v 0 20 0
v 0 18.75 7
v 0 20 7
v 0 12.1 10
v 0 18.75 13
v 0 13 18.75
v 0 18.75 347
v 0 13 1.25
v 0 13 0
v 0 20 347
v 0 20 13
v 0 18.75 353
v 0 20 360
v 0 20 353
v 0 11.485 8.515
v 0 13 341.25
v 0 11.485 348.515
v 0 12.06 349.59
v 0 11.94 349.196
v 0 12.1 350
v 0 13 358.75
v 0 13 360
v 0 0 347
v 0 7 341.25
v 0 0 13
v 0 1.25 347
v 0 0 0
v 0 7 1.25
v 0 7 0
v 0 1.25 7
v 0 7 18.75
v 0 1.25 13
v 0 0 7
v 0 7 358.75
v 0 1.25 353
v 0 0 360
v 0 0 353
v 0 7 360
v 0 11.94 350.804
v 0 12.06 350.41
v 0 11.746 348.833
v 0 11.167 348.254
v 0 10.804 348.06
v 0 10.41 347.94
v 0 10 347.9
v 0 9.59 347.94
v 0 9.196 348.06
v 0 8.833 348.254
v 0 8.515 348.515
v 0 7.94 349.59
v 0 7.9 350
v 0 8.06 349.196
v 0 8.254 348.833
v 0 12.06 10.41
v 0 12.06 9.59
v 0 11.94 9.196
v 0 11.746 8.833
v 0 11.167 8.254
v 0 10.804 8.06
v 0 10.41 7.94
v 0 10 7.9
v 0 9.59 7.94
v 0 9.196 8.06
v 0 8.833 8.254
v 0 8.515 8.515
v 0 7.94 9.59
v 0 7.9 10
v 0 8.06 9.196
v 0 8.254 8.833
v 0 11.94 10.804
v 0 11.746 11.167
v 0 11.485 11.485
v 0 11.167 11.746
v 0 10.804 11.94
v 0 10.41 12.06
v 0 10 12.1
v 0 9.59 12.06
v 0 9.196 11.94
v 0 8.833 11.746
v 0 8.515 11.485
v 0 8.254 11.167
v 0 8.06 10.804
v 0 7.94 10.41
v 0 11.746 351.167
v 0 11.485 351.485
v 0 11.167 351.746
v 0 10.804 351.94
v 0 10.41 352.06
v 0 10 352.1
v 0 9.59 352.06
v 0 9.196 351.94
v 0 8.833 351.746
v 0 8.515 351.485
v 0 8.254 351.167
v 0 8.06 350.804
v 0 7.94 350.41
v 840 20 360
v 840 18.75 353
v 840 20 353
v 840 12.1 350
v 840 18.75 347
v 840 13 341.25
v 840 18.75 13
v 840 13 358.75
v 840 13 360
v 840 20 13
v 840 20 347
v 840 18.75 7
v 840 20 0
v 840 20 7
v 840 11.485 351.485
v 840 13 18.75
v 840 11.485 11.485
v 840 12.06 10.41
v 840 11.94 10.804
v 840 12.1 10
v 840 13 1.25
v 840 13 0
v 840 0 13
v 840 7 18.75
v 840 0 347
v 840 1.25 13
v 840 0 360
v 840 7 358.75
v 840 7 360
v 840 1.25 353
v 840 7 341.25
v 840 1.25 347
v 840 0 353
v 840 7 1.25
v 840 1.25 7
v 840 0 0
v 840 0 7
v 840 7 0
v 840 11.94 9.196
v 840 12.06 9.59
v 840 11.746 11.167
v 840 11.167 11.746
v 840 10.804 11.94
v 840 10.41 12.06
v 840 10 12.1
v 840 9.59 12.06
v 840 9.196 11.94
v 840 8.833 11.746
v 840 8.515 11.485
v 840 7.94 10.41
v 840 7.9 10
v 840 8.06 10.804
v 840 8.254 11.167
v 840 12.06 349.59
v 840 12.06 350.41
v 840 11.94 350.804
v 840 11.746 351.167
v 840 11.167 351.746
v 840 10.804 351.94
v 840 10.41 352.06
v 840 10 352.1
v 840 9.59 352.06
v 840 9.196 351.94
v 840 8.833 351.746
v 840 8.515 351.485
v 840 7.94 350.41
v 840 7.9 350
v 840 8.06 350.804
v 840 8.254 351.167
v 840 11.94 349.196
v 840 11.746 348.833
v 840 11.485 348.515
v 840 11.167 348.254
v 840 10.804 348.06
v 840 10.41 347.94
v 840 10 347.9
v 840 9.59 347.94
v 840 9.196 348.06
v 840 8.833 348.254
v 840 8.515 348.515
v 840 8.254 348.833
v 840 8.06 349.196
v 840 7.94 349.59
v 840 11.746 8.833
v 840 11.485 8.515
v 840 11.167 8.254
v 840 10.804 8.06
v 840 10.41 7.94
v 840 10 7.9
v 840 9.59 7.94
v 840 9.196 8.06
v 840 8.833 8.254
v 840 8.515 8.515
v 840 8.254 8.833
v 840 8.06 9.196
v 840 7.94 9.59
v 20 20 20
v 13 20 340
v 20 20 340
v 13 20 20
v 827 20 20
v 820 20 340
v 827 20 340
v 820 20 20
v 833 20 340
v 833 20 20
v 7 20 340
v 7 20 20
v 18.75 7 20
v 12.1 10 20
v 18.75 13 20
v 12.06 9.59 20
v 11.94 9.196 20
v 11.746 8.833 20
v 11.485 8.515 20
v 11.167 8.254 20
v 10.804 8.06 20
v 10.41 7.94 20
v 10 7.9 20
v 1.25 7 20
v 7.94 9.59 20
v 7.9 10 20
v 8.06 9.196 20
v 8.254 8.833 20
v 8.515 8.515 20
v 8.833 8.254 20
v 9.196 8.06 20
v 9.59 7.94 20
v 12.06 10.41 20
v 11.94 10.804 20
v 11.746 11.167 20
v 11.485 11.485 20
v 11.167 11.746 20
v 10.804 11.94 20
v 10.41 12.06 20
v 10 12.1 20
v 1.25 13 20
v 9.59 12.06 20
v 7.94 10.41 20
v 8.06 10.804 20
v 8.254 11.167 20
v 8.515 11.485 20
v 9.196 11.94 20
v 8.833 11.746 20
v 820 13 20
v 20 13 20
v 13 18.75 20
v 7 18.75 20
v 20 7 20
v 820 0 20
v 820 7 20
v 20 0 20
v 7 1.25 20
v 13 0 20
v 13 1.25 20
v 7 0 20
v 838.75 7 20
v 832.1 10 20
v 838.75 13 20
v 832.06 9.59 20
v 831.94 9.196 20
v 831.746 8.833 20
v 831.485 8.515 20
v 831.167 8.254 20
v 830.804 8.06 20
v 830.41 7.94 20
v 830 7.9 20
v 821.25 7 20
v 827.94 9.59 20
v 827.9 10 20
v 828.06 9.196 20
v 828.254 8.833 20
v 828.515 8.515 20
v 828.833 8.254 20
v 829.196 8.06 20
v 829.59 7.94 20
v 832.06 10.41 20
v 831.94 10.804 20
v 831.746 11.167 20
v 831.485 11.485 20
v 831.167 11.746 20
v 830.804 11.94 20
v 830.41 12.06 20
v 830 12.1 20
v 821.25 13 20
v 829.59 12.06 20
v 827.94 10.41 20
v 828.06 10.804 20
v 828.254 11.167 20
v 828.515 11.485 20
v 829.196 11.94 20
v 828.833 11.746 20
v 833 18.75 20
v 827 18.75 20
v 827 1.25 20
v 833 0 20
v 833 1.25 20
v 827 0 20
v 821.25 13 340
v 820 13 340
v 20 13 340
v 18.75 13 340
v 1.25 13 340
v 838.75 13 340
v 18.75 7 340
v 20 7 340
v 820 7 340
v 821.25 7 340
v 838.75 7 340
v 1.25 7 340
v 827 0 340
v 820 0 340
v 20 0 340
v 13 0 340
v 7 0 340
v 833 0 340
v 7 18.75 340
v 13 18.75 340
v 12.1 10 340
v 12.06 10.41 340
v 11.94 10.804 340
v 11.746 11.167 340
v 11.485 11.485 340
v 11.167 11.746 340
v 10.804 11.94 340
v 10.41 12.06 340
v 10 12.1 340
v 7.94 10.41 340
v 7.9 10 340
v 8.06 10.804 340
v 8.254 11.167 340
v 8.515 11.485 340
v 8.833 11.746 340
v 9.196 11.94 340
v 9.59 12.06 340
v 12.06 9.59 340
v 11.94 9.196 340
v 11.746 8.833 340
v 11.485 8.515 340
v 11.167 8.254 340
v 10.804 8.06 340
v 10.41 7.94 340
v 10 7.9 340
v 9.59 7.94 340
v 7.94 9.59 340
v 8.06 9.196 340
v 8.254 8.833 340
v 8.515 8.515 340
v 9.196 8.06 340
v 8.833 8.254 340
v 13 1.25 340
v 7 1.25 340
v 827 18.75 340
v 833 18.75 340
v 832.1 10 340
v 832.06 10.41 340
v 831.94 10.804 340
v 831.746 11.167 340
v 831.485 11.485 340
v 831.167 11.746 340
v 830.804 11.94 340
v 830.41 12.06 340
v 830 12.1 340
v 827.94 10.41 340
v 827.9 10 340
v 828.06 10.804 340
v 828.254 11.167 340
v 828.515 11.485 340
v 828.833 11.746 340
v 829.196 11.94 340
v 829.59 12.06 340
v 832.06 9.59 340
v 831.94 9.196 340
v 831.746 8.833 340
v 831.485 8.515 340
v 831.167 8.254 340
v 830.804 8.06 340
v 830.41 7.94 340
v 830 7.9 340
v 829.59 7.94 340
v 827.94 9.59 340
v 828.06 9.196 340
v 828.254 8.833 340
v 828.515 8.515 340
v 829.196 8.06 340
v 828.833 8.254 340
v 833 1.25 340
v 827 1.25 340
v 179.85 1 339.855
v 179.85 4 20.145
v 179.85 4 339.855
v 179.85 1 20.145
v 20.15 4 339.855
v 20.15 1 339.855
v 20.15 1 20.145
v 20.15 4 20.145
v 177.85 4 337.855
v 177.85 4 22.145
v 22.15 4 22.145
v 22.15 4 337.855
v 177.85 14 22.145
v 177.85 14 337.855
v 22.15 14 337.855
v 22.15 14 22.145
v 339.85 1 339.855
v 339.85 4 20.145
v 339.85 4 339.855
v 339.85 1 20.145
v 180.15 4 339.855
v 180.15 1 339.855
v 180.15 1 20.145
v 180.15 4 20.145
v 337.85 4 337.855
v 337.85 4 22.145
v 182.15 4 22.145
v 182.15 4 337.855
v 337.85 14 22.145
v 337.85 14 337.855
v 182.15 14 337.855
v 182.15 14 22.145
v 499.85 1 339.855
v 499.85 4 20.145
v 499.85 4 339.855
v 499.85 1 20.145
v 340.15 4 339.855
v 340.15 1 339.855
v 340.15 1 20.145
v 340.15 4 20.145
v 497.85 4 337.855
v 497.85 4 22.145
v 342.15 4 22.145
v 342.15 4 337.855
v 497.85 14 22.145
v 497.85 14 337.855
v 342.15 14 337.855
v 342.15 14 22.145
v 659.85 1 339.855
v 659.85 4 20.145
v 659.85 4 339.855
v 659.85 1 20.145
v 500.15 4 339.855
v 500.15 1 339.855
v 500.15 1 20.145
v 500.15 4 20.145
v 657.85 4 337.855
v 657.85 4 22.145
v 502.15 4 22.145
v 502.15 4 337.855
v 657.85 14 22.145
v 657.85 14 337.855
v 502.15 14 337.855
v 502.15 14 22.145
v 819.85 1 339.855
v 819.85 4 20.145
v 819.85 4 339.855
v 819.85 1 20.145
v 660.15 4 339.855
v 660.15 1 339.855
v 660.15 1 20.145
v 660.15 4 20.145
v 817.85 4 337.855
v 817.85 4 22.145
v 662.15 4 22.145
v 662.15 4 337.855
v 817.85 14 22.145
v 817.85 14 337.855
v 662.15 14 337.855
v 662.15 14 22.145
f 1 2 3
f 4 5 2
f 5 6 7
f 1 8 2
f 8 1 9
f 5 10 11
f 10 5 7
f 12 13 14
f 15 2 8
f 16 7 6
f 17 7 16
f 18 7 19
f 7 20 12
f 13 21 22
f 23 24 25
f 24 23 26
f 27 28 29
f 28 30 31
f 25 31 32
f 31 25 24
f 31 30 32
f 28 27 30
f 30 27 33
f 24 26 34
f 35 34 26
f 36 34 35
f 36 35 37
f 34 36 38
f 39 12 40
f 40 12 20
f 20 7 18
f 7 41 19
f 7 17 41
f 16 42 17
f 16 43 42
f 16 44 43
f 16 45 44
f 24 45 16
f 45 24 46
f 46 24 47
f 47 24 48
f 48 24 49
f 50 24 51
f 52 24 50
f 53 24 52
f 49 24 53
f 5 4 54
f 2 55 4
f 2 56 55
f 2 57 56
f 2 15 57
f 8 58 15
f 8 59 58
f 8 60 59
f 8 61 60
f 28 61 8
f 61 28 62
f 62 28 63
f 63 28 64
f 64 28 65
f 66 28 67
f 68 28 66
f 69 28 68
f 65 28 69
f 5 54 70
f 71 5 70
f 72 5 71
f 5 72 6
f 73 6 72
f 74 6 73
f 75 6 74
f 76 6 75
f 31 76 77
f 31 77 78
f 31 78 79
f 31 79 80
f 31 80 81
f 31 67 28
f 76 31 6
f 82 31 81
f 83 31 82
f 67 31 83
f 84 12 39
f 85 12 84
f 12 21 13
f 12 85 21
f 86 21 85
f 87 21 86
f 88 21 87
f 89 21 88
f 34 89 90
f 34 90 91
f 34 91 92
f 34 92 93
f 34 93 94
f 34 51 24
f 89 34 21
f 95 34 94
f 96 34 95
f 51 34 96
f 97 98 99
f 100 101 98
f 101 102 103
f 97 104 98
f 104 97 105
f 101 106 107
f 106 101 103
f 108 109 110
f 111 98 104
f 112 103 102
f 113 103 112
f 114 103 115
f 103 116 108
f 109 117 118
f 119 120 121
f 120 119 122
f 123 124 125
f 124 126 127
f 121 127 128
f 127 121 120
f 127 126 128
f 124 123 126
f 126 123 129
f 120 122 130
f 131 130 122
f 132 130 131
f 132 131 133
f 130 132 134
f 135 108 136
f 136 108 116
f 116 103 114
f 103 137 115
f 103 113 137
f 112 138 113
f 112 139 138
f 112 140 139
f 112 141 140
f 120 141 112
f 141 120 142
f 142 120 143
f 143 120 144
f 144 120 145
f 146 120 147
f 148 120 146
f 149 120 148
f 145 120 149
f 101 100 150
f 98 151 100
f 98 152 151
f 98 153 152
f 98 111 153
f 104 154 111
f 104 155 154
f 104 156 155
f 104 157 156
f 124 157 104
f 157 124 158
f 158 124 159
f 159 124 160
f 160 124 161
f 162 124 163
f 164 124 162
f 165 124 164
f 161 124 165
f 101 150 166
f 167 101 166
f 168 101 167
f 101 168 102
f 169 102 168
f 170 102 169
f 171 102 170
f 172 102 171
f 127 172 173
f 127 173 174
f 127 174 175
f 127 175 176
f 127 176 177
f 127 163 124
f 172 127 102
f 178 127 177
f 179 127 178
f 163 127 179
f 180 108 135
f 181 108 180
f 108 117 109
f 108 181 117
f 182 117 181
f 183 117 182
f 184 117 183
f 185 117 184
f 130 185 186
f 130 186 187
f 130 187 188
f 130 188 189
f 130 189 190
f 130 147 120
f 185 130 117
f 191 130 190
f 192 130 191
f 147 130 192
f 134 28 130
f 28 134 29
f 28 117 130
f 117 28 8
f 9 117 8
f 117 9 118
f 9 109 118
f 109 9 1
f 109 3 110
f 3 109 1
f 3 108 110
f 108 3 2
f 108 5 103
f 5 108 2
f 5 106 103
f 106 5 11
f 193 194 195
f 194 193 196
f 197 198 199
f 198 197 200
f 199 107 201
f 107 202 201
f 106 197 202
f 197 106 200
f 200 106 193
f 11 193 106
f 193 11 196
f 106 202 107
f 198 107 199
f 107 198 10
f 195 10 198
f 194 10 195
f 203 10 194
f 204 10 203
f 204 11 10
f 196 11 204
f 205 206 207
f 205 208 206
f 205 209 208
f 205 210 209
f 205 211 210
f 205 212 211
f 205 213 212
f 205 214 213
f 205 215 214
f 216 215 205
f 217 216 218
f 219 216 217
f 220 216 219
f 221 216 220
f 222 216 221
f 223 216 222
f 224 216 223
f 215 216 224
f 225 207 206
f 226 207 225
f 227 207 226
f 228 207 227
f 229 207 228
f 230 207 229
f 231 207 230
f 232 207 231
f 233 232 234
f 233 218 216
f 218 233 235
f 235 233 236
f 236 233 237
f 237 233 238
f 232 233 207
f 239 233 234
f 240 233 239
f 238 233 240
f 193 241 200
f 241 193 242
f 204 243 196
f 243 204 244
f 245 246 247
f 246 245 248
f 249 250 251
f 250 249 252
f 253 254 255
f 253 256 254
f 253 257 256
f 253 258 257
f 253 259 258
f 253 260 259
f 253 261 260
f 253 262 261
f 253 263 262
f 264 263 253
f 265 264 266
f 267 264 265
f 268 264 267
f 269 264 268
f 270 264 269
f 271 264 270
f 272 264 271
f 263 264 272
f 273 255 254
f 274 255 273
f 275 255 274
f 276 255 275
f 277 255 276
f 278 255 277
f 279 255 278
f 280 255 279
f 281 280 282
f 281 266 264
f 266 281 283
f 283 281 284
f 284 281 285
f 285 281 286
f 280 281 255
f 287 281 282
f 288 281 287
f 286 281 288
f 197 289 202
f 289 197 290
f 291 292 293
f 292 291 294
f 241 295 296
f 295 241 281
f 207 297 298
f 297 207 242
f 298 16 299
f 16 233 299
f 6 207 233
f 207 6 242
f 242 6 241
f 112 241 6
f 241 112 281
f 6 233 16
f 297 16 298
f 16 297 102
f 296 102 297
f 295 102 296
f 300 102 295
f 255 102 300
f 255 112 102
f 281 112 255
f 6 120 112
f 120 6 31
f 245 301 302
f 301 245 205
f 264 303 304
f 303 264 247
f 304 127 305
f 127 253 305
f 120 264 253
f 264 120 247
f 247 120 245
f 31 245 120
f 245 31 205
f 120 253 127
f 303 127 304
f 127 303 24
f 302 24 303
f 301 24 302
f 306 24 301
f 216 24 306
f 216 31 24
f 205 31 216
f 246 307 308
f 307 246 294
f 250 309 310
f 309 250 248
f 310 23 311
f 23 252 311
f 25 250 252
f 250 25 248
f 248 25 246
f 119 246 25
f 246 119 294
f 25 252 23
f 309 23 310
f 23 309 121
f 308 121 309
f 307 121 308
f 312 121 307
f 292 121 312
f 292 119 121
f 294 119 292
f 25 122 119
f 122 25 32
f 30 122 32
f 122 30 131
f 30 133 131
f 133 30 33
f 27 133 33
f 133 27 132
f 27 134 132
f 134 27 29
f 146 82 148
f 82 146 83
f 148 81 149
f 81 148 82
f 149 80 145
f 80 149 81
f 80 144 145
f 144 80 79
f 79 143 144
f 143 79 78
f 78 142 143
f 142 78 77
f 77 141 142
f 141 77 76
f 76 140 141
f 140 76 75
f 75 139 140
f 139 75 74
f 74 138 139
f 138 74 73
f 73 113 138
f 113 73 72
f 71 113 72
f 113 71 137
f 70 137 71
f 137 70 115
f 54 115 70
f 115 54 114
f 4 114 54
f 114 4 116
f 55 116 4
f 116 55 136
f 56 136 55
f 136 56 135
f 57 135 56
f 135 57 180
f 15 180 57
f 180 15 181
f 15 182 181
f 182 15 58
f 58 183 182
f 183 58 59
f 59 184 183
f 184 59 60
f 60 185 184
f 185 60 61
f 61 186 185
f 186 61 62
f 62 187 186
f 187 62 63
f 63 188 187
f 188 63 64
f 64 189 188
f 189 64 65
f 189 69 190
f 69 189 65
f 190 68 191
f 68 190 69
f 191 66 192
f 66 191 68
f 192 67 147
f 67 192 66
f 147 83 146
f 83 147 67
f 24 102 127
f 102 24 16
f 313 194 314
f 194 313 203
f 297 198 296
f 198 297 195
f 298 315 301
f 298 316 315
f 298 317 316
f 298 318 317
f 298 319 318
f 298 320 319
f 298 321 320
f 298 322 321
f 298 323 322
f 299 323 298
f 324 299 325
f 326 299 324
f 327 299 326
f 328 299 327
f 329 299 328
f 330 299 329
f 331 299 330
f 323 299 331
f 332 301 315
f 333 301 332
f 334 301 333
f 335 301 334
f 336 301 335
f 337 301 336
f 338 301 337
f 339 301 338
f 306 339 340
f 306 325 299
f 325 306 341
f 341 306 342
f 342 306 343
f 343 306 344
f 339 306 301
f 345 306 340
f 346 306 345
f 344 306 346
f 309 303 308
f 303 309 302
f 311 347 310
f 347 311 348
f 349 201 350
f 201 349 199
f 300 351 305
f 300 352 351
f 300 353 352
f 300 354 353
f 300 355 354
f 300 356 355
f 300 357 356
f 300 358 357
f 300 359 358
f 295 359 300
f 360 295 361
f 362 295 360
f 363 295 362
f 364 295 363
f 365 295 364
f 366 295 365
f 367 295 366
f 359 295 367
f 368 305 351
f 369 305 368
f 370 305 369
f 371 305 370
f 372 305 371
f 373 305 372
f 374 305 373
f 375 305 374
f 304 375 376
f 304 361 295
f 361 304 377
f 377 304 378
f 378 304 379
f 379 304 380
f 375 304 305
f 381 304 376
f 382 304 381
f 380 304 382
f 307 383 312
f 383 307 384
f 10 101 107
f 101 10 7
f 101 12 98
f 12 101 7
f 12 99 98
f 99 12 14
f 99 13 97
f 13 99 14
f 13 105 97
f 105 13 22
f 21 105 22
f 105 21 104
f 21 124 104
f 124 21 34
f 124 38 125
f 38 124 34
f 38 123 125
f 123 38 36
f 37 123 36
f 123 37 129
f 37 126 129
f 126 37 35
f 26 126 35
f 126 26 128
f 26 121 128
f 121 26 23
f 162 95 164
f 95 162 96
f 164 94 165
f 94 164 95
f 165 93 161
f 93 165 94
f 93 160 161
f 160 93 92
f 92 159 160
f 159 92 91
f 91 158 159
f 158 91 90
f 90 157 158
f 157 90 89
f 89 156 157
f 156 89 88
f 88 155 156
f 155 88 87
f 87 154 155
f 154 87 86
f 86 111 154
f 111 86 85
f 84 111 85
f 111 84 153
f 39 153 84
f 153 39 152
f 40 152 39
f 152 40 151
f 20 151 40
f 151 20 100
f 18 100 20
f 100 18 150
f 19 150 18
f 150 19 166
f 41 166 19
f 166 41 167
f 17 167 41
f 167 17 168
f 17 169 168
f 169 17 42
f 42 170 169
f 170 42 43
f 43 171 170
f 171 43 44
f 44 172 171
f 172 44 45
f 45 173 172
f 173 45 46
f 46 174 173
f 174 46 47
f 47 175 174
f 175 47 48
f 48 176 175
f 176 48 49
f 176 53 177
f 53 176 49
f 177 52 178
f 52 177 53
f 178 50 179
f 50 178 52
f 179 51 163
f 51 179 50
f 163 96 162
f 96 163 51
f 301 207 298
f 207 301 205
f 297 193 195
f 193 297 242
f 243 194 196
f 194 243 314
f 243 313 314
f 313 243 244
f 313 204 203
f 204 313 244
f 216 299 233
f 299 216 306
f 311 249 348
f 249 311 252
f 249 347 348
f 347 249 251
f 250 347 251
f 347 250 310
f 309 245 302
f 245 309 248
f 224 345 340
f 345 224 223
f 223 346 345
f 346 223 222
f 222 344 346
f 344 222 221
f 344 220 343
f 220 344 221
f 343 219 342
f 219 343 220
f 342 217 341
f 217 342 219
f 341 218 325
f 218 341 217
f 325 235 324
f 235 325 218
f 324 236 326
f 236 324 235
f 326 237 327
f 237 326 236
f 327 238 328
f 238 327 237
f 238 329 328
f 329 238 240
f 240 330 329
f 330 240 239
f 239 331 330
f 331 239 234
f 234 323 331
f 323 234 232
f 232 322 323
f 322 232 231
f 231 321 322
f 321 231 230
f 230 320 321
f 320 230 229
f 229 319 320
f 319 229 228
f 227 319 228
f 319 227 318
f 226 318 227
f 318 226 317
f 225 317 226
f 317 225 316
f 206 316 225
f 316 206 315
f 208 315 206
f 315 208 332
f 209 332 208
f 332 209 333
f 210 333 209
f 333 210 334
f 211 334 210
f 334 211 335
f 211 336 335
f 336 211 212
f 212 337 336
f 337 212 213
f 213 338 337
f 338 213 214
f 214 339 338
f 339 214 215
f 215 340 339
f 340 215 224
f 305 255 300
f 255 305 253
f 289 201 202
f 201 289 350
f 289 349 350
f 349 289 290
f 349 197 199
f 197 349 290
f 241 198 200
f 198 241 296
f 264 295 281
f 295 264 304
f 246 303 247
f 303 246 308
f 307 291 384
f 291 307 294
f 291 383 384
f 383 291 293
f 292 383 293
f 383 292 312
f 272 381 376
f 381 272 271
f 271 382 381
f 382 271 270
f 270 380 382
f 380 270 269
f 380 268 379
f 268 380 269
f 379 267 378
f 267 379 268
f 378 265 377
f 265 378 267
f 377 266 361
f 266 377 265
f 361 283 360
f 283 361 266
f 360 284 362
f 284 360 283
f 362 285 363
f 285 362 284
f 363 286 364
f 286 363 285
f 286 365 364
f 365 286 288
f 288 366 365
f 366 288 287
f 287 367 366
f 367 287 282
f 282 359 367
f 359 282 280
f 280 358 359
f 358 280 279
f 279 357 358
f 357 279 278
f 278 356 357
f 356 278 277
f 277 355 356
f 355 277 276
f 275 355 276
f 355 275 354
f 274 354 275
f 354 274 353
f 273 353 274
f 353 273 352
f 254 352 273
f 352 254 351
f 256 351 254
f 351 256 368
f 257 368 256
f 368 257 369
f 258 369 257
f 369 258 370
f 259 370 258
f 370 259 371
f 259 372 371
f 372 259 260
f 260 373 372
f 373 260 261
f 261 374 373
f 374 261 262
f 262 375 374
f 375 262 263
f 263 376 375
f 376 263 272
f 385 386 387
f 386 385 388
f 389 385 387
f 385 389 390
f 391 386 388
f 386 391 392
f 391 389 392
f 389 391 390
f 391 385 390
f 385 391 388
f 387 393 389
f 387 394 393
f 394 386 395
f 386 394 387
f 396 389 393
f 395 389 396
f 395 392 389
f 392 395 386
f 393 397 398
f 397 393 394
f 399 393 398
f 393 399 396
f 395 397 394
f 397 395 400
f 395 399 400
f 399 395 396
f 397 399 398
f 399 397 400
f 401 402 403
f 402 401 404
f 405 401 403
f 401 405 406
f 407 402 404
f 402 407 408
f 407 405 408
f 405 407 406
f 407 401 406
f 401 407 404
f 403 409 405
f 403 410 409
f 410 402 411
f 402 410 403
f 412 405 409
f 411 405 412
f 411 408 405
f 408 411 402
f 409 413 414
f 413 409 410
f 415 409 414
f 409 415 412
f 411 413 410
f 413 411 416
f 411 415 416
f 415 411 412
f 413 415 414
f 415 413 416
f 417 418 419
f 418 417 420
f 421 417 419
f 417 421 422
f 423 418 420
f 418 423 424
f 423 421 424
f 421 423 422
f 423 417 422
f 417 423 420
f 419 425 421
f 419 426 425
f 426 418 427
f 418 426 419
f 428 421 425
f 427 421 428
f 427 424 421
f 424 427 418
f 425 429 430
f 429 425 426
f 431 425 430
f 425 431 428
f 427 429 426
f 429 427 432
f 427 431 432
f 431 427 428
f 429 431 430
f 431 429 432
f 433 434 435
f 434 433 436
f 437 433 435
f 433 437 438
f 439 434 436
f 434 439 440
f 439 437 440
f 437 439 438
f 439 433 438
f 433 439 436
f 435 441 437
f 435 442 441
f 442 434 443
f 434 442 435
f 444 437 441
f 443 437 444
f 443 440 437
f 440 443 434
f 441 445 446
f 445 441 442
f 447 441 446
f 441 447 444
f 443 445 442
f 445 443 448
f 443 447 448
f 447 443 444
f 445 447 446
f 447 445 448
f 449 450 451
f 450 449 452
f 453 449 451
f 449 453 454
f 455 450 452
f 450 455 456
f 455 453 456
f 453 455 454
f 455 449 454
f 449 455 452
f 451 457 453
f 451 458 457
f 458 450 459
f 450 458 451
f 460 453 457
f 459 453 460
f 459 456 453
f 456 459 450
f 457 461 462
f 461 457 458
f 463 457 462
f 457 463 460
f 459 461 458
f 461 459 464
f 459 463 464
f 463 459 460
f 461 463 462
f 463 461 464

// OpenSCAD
// ============================================================================
// Aluminium frame and HUB75 LED panels
// ============================================================================

/* [Component view] */

component_selection = "assembled"; // [assembled,exploded,all_unique,frame_only,led_panel]
component_orientation = "model"; // [model,print]
include_led_panels = true;

/* [Geometry quality] */

curve_segments = 48;
$fn = curve_segments;

// ----------------------------------------------------------------------------
// Local component dimensions
// ----------------------------------------------------------------------------

aluminium_profile_size = 20;
frame_width = 840;
frame_height = 360;
vertical_profile_length = frame_height-2*aluminium_profile_size;

led_panel_width = 159.70;
led_panel_height = 319.71;
led_panel_depth = 13.00;
led_panel_count = 5;
led_panel_front_offset = 1;

aluminium_color = [0.70,0.72,0.74,1];
led_front_color = [0.015,0.015,0.015,1];
led_pcb_color = [0.02,0.20,0.07,1];
led_rear_color = [0.07,0.08,0.07,1];

frame_explode_distance = 55;
led_panels_explode_distance = 85;
component_spacing = 70;

inner_width = frame_width-2*aluminium_profile_size;
led_panel_pitch = inner_width/led_panel_count;
led_panel_x_margin = (led_panel_pitch-led_panel_width)/2;
led_panel_z_offset = aluminium_profile_size
    +(vertical_profile_length-led_panel_height)/2;

assert(frame_width == 840,
    "The aluminium frame must remain 840 mm wide.");
assert(frame_height == 360,
    "The aluminium frame must remain 360 mm high.");
assert(led_panel_count == 5,
    "The frame must contain five HUB75 panels.");
assert(led_panel_count*led_panel_pitch == inner_width,
    "The five panel positions must fill the inner frame width.");
assert(led_panel_width <= led_panel_pitch,
    "Each HUB75 panel must fit inside its frame position.");

function led_panel_x(index) =
    aluminium_profile_size
    +index*led_panel_pitch
    +led_panel_x_margin;

// ----------------------------------------------------------------------------
// Unique parts
// ----------------------------------------------------------------------------

module aluminium_profile_cross_section() {
    difference() {
        square([aluminium_profile_size,aluminium_profile_size],center=true);
        circle(d=4.2,$fn=32);

        for(angle=[0:90:270])
            rotate(angle)
                translate([0,aluminium_profile_size/2])
                    square([6,2.5],center=true);
    }
}

module aluminium_profile(length,horizontal=true) {
    color(aluminium_color)
    if(horizontal)
        translate([
            0,
            aluminium_profile_size/2,
            aluminium_profile_size/2
        ])
            rotate([0,90,0])
                linear_extrude(height=length,convexity=10)
                    aluminium_profile_cross_section();
    else
        translate([
            aluminium_profile_size/2,
            aluminium_profile_size/2,
            0
        ])
            linear_extrude(height=length,convexity=10)
                aluminium_profile_cross_section();
}

module hub75_led_panel() {
    color(led_front_color)
        cube([led_panel_width,1.5,led_panel_height]);

    color(led_pcb_color)
        translate([0,1.5,0])
            cube([led_panel_width,1.5,led_panel_height]);

    color(led_rear_color)
        translate([2,3,2])
            cube([
                led_panel_width-4,
                led_panel_depth-3,
                led_panel_height-4
            ]);
}

// ----------------------------------------------------------------------------
// Component assemblies in local coordinates
// ----------------------------------------------------------------------------

module aluminium_frame_geometry(y_offset=0) {
    translate([0,y_offset,0]) {
        aluminium_profile(frame_width,true);

        translate([0,0,frame_height-aluminium_profile_size])
            aluminium_profile(frame_width,true);

        translate([0,0,aluminium_profile_size])
            aluminium_profile(vertical_profile_length,false);

        translate([
            frame_width-aluminium_profile_size,
            0,
            aluminium_profile_size
        ])
            aluminium_profile(vertical_profile_length,false);
    }
}

module hub75_led_panel_set(y_offset=0) {
    translate([0,led_panel_front_offset+y_offset,led_panel_z_offset])
        for(index=[0:led_panel_count-1])
            translate([led_panel_x(index),0,0])
                hub75_led_panel();
}

module aluminium_frame_package(
    show_frame=true,
    show_led_panels=true,
    frame_y_offset=0,
    panel_y_offset=0
) {
    if(show_frame)
        aluminium_frame_geometry(frame_y_offset);

    if(show_led_panels)
        hub75_led_panel_set(panel_y_offset);
}

// Backward-compatible public module used by main.scad.
module aluminium_frame(include_led_panels=false) {
    aluminium_frame_package(true,include_led_panels);
}

module aluminium_frame_view(
    selection="assembled",
    orientation="model",
    show_led_panels=true
) {
    rotate_for_print = orientation == "print" ? [90,0,0] : [0,0,0];

    rotate(rotate_for_print) {
        if(selection == "assembled")
            aluminium_frame_package(true,show_led_panels);
        else if(selection == "exploded")
            aluminium_frame_package(
                true,
                show_led_panels,
                frame_explode_distance,
                led_panels_explode_distance
            );
        else if(selection == "all_unique") {
            aluminium_profile(140,true);
            translate([190,0,0])
                aluminium_profile(140,false);
            translate([260,0,0])
                hub75_led_panel();
        }
        else if(selection == "frame_only")
            aluminium_frame_geometry();
        else if(selection == "led_panel")
            hub75_led_panel();
        else
            assert(false,str("Unknown component_selection: ",selection));
    }
}

aluminium_frame_view(
    component_selection,
    component_orientation,
    include_led_panels
);
